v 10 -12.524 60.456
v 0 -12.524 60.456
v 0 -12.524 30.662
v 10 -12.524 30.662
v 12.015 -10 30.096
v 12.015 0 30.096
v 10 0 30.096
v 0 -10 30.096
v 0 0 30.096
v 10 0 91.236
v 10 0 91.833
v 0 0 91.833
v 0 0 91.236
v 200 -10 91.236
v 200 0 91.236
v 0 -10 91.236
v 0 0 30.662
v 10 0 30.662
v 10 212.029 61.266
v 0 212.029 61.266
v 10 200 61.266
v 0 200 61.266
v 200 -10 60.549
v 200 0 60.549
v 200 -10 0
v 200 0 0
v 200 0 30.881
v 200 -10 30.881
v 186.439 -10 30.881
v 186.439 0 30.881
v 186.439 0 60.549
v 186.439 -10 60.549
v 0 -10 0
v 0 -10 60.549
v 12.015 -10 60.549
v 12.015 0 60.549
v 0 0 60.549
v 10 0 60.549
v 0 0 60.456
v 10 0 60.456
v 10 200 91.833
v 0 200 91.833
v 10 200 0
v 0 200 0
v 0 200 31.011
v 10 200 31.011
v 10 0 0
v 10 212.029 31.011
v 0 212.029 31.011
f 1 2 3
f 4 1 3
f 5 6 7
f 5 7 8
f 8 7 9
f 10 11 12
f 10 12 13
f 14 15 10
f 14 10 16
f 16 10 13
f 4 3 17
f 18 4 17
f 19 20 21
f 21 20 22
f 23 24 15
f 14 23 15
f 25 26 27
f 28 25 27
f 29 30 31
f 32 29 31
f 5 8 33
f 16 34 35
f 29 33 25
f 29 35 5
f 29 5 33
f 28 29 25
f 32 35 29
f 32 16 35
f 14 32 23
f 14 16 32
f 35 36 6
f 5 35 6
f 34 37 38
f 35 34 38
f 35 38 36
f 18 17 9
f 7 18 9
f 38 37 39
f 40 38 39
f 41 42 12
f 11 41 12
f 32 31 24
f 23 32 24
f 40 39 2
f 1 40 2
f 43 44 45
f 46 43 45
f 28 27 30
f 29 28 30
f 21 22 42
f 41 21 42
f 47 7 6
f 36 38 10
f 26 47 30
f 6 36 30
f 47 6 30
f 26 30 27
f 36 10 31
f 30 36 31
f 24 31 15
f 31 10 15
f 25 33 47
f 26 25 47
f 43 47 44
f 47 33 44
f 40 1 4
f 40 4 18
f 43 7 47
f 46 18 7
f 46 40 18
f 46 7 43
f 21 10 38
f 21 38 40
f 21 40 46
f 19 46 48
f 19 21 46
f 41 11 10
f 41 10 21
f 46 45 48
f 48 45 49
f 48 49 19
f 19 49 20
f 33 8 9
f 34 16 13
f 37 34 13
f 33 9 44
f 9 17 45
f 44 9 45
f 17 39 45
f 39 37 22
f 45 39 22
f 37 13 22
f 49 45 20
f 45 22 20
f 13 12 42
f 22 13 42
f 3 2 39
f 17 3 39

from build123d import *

# Parameters (mm, degrees)
F2_DEPTH = 10
F3_DEPTH = 10


with BuildPart() as f2:
    # F0 (on Front) → F2 (new body)
    with BuildSketch(Plane.XZ):
        Polygon((0, 30.096302), (0, 0), (200, 0), (200, 30.88115), (186.43856, 30.88115), (186.43856, 60.549472), (200, 60.549472), (200, 91.236152), (0, 91.236152), (0, 60.549472), (12.01473, 60.549472), (12.01473, 30.096302), align=None)
    extrude(amount=F2_DEPTH)

    # F1 (on Right) → F3 (join)
    with BuildSketch(Plane.YZ):
        Polygon((0, 30.661654), (0, 0), (200, 0), (200, 31.010987), (212.028906, 31.010987), (212.028906, 61.265942), (200, 61.265942), (200, 91.832541), (0, 91.832541), (0, 60.456097), (-12.524211, 60.456097), (-12.524211, 30.661654), align=None)
    extrude(amount=F3_DEPTH)


solid = f2.part
